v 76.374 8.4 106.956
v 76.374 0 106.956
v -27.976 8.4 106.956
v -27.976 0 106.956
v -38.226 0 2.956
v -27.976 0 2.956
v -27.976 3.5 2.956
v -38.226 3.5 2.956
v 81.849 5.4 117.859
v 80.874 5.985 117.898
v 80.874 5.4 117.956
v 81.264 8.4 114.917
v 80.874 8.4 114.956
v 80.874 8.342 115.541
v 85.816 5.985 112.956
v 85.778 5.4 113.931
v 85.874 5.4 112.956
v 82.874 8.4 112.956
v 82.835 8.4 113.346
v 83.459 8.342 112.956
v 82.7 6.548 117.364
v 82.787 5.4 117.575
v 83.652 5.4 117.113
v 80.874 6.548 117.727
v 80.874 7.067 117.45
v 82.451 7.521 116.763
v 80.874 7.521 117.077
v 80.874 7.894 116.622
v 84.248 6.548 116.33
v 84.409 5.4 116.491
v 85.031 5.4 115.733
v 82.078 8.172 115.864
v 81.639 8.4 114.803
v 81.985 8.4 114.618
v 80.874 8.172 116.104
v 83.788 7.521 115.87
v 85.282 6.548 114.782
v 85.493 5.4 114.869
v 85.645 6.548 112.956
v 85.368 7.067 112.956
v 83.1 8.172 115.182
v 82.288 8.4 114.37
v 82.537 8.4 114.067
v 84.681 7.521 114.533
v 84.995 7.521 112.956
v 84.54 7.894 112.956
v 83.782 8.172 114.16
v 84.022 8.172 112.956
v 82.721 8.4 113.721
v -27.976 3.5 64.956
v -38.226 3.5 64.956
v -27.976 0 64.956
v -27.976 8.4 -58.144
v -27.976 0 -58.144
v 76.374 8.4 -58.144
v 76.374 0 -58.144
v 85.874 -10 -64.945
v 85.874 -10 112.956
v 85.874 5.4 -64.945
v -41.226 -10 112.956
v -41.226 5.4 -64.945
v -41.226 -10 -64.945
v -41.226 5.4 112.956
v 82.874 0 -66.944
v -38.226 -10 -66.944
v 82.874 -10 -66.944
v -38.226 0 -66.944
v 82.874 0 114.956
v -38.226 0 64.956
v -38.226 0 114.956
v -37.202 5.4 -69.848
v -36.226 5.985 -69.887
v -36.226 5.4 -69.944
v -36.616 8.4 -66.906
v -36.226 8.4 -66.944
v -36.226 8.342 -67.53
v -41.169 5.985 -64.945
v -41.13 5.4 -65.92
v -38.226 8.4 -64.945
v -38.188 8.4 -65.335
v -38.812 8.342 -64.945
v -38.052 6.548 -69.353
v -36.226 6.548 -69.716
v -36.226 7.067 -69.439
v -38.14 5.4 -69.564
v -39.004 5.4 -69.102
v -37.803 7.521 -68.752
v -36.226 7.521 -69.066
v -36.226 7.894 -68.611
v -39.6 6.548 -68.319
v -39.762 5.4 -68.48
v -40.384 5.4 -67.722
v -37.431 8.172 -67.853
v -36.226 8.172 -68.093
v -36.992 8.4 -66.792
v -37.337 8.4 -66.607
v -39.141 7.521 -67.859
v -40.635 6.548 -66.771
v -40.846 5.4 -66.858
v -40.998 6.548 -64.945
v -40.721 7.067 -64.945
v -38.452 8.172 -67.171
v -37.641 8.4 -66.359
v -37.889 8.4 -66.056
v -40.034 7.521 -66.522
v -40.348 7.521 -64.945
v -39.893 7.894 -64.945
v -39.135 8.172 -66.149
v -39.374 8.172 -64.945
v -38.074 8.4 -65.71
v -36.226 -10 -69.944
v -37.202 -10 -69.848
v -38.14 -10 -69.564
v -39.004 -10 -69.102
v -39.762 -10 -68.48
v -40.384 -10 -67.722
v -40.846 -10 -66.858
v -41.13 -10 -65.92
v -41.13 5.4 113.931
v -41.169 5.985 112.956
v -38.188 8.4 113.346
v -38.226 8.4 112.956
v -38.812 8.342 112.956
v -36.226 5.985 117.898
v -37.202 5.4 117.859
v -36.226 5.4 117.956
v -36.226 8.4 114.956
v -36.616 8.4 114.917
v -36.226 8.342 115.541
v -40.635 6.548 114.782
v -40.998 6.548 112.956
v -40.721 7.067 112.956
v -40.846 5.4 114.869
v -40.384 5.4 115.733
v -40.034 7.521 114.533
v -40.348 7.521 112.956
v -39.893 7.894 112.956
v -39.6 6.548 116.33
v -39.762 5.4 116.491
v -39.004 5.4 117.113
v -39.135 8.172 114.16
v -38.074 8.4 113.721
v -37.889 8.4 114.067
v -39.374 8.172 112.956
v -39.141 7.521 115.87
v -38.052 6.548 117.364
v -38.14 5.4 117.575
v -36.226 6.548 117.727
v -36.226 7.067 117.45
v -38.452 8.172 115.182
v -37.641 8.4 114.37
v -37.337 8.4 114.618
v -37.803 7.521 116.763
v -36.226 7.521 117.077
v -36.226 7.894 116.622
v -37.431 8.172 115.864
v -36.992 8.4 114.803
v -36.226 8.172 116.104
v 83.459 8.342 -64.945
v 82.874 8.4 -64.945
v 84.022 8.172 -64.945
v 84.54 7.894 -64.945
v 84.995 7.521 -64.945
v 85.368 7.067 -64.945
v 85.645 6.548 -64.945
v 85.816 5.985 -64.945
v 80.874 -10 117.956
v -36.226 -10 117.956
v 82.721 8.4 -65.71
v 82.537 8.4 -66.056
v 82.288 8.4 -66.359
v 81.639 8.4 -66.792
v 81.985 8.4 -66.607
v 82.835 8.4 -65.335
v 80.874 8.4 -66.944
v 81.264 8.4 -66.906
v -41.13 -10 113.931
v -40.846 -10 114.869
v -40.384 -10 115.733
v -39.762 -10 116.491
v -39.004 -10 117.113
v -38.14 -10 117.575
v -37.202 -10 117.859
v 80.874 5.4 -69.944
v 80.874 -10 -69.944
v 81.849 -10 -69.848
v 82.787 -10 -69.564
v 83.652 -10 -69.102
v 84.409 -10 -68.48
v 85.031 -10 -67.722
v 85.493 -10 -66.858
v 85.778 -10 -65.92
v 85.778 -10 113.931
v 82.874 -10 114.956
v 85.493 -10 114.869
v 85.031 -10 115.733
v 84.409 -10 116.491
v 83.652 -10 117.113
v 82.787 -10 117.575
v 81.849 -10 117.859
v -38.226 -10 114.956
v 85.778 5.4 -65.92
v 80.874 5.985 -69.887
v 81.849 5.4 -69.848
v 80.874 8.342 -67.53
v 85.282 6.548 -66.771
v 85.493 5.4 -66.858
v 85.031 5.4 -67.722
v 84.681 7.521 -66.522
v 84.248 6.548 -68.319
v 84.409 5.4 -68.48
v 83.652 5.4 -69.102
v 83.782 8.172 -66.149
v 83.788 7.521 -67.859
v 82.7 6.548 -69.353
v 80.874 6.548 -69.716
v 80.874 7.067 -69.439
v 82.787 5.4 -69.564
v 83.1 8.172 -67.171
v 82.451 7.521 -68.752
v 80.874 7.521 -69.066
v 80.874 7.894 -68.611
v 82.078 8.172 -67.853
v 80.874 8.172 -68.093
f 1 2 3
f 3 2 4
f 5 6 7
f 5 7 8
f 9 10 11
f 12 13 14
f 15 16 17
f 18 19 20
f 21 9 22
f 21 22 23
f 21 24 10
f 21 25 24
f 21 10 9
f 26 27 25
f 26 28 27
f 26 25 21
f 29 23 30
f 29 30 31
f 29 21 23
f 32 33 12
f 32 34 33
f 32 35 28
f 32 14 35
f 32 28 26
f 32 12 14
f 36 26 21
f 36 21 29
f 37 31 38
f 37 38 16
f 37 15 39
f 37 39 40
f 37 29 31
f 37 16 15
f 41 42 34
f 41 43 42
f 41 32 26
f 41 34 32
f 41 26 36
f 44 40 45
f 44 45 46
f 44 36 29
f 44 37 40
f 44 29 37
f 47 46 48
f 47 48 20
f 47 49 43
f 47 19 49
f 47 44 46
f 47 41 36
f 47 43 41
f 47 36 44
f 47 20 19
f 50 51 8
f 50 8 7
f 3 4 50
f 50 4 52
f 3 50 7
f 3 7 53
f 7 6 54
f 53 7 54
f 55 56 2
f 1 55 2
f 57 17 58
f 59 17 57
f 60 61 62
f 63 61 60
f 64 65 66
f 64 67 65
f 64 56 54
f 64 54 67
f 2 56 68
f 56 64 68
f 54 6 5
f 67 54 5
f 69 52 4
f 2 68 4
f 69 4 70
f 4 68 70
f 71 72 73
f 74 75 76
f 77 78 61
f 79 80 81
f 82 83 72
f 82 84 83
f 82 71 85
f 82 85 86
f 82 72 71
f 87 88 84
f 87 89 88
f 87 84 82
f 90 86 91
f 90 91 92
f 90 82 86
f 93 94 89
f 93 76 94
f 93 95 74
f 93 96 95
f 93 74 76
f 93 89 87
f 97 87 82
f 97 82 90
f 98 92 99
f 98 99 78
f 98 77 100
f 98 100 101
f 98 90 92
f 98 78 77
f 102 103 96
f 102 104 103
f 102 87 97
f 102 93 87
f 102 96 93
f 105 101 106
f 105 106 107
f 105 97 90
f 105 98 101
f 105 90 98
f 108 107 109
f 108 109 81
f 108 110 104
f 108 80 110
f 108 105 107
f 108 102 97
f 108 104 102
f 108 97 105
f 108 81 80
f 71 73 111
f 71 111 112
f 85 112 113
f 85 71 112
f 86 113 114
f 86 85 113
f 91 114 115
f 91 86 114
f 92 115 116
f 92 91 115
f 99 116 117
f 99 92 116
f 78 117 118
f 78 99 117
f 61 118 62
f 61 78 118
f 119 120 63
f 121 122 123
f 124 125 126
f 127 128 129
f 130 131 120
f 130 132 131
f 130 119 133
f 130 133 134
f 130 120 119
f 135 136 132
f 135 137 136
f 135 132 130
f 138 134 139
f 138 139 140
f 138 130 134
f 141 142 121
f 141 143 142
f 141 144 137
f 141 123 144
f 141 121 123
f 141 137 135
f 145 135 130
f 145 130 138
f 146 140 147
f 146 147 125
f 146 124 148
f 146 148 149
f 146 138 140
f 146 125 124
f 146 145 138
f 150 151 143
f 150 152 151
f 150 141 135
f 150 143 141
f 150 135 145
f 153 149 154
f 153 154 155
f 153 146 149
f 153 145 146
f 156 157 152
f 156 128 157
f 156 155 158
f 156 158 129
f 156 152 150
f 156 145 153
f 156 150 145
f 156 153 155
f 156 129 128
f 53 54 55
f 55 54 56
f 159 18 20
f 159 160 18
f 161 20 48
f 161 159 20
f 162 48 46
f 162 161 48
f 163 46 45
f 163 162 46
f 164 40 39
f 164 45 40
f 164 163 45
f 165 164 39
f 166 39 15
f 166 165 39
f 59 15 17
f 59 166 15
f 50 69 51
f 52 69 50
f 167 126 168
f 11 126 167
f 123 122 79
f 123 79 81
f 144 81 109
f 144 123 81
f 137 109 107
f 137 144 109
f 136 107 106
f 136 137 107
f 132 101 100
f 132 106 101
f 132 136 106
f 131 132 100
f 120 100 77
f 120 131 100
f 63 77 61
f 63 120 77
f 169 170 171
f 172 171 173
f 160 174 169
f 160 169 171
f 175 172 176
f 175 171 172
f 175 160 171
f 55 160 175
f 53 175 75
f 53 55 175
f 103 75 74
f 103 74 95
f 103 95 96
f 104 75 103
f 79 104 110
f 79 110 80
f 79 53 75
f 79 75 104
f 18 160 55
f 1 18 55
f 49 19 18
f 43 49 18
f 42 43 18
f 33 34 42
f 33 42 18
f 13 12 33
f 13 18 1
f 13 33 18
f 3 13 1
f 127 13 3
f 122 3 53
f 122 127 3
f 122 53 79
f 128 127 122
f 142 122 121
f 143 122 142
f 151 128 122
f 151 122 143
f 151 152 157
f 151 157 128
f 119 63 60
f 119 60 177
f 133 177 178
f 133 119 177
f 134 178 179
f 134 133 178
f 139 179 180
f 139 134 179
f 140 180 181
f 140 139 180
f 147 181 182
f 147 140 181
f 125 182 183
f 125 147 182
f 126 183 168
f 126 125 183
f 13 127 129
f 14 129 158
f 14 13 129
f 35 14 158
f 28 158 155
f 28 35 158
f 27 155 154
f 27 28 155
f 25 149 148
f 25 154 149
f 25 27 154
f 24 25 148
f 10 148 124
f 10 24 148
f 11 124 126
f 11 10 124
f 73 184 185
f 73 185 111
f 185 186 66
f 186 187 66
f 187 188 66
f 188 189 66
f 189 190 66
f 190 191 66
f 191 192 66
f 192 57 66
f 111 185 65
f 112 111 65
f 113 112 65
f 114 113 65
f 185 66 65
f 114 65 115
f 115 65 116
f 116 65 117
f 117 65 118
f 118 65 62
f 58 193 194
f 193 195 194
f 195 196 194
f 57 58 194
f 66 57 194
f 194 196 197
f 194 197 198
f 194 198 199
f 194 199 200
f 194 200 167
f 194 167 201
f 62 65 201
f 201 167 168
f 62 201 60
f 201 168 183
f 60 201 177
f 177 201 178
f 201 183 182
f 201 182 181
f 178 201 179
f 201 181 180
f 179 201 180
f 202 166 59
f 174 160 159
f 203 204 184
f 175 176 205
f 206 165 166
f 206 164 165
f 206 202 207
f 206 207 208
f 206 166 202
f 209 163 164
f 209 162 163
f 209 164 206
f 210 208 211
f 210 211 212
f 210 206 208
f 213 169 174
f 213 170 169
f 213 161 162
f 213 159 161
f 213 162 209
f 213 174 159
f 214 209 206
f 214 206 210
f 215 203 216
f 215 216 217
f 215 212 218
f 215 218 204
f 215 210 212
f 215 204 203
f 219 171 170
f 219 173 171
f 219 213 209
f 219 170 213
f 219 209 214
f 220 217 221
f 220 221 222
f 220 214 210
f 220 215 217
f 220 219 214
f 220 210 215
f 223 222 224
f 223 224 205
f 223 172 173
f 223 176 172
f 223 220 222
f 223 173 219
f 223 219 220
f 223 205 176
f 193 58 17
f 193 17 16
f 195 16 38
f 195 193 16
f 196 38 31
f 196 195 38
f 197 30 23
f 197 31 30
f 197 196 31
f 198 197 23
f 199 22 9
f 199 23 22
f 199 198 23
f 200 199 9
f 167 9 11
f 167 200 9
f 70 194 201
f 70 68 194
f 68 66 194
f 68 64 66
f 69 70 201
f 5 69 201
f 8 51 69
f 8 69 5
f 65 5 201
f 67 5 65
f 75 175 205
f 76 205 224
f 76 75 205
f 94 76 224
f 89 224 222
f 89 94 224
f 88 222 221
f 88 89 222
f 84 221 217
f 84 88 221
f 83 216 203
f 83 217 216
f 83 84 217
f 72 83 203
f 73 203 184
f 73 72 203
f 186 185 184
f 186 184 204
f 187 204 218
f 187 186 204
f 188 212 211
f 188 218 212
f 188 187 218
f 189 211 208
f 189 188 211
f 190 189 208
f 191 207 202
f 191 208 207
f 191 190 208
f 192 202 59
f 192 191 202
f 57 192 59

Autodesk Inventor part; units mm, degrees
ref_plane "YZ Plane" through (0, 0, 0) normal (1, 0, 0) x (0, 1, 0)
ref_plane "XZ Plane" through (0, 0, 0) normal (0, 1, 0) x (-1, 0, 0)
ref_plane "XY Plane" through (0, 0, 0) normal (0, 0, 1) x (1, 0, 0)
sketch "Sketch1" plane through (0, 0, 0) normal (0, 1, 0) x (-1, 0, 0)
  line L0 (-76.3737, 106.9555) -> (27.9763, 106.9555)
  line L1 (27.9763, 106.9555) -> (27.9763, -58.1445)
  line L2 (27.9763, -58.1445) -> (-76.3737, -58.1445)
  line L3 (-76.3737, -58.1445) -> (-76.3737, 106.9555)
  line L4 (-76.3737, 106.9555) -> (27.9763, -58.1445) construction
  line L5 (27.9763, 106.9555) -> (-76.3737, -58.1445) construction
  line L6 (38.2263, 114.9555) -> (38.2263, -66.9445)
  line L7 (38.2263, -66.9445) -> (-82.8737, -66.9445)
  line L8 (-82.8737, -66.9445) -> (-82.8737, 114.9555)
  line L9 (-82.8737, 114.9555) -> (38.2263, 114.9555)
  line L10 (41.2263, -69.9445) -> (41.2263, 117.9555)
  line L11 (41.2263, 117.9555) -> (-85.8737, 117.9555)
  line L12 (-85.8737, 117.9555) -> (-85.8737, -69.9445)
  line L13 (-85.8737, -69.9445) -> (41.2263, -69.9445)
  point P0 (-24.1987, 24.4055)
  dimension "d17" = 104.35
  dimension "d18" = 165.1
  dimension "d19" = 8.8
  dimension "d20" = 6.5
  dimension "d21" = 8
  dimension "d22" = 10.25
  dimension "d23" = 3
extrude "Extrusion1" add sketch "Sketch1" along normal blind 8.4 contours L6 L7 L8 L9 | L13 L12 L11 L10
extrude "Extrusion3" add sketch "Sketch1" against normal blind 10 contours L13 L12 L11 L10
fillet "Fillet3" radius 5 4 edges at (-41.2263, -0.8, 117.9555) (-41.2263, -0.8, -69.9445) (85.8737, -0.8, 117.9555) (85.8737, -0.8, -69.9445)
fillet "Fillet4" radius 3 8 edges at (22.3237, 8.4, -69.9445) (-39.7619, 8.4, -68.48) (-41.2263, 8.4, 24.0055) (-39.7619, 8.4, 116.491) (22.3237, 8.4, 117.9555) (84.4092, 8.4, 116.491) (85.8737, 8.4, 24.0055) (84.4092, 8.4, -68.48)
sketch "Sketch4" plane through (0, 0, 0) normal (0, -1, 0) x (1, 0, 0)
  line L0 (-38.2263, 112.9555) -> (-38.2263, -64.9445) projected
  line L1 (-27.9763, 106.9555) -> (-27.9763, -58.1445) projected
  line L2 (-38.2263, 64.9555) -> (-27.9763, 64.9555)
  line L3 (-27.9763, 64.9555) -> (-27.9763, 2.9555)
  line L4 (-27.9763, 2.9555) -> (-38.2263, 2.9555)
  line L5 (-38.2263, 2.9555) -> (-38.2263, 64.9555)
  line L6 (-38.2263, 114.9555) -> (82.8737, 114.9555) projected
  point P0 (0, 0)
  dimension "d28" = 50
  dimension "d29" = 62
extrude "Extrusion4" cut sketch "Sketch4" against normal blind 3.5
properties part number "top lcd mount"
